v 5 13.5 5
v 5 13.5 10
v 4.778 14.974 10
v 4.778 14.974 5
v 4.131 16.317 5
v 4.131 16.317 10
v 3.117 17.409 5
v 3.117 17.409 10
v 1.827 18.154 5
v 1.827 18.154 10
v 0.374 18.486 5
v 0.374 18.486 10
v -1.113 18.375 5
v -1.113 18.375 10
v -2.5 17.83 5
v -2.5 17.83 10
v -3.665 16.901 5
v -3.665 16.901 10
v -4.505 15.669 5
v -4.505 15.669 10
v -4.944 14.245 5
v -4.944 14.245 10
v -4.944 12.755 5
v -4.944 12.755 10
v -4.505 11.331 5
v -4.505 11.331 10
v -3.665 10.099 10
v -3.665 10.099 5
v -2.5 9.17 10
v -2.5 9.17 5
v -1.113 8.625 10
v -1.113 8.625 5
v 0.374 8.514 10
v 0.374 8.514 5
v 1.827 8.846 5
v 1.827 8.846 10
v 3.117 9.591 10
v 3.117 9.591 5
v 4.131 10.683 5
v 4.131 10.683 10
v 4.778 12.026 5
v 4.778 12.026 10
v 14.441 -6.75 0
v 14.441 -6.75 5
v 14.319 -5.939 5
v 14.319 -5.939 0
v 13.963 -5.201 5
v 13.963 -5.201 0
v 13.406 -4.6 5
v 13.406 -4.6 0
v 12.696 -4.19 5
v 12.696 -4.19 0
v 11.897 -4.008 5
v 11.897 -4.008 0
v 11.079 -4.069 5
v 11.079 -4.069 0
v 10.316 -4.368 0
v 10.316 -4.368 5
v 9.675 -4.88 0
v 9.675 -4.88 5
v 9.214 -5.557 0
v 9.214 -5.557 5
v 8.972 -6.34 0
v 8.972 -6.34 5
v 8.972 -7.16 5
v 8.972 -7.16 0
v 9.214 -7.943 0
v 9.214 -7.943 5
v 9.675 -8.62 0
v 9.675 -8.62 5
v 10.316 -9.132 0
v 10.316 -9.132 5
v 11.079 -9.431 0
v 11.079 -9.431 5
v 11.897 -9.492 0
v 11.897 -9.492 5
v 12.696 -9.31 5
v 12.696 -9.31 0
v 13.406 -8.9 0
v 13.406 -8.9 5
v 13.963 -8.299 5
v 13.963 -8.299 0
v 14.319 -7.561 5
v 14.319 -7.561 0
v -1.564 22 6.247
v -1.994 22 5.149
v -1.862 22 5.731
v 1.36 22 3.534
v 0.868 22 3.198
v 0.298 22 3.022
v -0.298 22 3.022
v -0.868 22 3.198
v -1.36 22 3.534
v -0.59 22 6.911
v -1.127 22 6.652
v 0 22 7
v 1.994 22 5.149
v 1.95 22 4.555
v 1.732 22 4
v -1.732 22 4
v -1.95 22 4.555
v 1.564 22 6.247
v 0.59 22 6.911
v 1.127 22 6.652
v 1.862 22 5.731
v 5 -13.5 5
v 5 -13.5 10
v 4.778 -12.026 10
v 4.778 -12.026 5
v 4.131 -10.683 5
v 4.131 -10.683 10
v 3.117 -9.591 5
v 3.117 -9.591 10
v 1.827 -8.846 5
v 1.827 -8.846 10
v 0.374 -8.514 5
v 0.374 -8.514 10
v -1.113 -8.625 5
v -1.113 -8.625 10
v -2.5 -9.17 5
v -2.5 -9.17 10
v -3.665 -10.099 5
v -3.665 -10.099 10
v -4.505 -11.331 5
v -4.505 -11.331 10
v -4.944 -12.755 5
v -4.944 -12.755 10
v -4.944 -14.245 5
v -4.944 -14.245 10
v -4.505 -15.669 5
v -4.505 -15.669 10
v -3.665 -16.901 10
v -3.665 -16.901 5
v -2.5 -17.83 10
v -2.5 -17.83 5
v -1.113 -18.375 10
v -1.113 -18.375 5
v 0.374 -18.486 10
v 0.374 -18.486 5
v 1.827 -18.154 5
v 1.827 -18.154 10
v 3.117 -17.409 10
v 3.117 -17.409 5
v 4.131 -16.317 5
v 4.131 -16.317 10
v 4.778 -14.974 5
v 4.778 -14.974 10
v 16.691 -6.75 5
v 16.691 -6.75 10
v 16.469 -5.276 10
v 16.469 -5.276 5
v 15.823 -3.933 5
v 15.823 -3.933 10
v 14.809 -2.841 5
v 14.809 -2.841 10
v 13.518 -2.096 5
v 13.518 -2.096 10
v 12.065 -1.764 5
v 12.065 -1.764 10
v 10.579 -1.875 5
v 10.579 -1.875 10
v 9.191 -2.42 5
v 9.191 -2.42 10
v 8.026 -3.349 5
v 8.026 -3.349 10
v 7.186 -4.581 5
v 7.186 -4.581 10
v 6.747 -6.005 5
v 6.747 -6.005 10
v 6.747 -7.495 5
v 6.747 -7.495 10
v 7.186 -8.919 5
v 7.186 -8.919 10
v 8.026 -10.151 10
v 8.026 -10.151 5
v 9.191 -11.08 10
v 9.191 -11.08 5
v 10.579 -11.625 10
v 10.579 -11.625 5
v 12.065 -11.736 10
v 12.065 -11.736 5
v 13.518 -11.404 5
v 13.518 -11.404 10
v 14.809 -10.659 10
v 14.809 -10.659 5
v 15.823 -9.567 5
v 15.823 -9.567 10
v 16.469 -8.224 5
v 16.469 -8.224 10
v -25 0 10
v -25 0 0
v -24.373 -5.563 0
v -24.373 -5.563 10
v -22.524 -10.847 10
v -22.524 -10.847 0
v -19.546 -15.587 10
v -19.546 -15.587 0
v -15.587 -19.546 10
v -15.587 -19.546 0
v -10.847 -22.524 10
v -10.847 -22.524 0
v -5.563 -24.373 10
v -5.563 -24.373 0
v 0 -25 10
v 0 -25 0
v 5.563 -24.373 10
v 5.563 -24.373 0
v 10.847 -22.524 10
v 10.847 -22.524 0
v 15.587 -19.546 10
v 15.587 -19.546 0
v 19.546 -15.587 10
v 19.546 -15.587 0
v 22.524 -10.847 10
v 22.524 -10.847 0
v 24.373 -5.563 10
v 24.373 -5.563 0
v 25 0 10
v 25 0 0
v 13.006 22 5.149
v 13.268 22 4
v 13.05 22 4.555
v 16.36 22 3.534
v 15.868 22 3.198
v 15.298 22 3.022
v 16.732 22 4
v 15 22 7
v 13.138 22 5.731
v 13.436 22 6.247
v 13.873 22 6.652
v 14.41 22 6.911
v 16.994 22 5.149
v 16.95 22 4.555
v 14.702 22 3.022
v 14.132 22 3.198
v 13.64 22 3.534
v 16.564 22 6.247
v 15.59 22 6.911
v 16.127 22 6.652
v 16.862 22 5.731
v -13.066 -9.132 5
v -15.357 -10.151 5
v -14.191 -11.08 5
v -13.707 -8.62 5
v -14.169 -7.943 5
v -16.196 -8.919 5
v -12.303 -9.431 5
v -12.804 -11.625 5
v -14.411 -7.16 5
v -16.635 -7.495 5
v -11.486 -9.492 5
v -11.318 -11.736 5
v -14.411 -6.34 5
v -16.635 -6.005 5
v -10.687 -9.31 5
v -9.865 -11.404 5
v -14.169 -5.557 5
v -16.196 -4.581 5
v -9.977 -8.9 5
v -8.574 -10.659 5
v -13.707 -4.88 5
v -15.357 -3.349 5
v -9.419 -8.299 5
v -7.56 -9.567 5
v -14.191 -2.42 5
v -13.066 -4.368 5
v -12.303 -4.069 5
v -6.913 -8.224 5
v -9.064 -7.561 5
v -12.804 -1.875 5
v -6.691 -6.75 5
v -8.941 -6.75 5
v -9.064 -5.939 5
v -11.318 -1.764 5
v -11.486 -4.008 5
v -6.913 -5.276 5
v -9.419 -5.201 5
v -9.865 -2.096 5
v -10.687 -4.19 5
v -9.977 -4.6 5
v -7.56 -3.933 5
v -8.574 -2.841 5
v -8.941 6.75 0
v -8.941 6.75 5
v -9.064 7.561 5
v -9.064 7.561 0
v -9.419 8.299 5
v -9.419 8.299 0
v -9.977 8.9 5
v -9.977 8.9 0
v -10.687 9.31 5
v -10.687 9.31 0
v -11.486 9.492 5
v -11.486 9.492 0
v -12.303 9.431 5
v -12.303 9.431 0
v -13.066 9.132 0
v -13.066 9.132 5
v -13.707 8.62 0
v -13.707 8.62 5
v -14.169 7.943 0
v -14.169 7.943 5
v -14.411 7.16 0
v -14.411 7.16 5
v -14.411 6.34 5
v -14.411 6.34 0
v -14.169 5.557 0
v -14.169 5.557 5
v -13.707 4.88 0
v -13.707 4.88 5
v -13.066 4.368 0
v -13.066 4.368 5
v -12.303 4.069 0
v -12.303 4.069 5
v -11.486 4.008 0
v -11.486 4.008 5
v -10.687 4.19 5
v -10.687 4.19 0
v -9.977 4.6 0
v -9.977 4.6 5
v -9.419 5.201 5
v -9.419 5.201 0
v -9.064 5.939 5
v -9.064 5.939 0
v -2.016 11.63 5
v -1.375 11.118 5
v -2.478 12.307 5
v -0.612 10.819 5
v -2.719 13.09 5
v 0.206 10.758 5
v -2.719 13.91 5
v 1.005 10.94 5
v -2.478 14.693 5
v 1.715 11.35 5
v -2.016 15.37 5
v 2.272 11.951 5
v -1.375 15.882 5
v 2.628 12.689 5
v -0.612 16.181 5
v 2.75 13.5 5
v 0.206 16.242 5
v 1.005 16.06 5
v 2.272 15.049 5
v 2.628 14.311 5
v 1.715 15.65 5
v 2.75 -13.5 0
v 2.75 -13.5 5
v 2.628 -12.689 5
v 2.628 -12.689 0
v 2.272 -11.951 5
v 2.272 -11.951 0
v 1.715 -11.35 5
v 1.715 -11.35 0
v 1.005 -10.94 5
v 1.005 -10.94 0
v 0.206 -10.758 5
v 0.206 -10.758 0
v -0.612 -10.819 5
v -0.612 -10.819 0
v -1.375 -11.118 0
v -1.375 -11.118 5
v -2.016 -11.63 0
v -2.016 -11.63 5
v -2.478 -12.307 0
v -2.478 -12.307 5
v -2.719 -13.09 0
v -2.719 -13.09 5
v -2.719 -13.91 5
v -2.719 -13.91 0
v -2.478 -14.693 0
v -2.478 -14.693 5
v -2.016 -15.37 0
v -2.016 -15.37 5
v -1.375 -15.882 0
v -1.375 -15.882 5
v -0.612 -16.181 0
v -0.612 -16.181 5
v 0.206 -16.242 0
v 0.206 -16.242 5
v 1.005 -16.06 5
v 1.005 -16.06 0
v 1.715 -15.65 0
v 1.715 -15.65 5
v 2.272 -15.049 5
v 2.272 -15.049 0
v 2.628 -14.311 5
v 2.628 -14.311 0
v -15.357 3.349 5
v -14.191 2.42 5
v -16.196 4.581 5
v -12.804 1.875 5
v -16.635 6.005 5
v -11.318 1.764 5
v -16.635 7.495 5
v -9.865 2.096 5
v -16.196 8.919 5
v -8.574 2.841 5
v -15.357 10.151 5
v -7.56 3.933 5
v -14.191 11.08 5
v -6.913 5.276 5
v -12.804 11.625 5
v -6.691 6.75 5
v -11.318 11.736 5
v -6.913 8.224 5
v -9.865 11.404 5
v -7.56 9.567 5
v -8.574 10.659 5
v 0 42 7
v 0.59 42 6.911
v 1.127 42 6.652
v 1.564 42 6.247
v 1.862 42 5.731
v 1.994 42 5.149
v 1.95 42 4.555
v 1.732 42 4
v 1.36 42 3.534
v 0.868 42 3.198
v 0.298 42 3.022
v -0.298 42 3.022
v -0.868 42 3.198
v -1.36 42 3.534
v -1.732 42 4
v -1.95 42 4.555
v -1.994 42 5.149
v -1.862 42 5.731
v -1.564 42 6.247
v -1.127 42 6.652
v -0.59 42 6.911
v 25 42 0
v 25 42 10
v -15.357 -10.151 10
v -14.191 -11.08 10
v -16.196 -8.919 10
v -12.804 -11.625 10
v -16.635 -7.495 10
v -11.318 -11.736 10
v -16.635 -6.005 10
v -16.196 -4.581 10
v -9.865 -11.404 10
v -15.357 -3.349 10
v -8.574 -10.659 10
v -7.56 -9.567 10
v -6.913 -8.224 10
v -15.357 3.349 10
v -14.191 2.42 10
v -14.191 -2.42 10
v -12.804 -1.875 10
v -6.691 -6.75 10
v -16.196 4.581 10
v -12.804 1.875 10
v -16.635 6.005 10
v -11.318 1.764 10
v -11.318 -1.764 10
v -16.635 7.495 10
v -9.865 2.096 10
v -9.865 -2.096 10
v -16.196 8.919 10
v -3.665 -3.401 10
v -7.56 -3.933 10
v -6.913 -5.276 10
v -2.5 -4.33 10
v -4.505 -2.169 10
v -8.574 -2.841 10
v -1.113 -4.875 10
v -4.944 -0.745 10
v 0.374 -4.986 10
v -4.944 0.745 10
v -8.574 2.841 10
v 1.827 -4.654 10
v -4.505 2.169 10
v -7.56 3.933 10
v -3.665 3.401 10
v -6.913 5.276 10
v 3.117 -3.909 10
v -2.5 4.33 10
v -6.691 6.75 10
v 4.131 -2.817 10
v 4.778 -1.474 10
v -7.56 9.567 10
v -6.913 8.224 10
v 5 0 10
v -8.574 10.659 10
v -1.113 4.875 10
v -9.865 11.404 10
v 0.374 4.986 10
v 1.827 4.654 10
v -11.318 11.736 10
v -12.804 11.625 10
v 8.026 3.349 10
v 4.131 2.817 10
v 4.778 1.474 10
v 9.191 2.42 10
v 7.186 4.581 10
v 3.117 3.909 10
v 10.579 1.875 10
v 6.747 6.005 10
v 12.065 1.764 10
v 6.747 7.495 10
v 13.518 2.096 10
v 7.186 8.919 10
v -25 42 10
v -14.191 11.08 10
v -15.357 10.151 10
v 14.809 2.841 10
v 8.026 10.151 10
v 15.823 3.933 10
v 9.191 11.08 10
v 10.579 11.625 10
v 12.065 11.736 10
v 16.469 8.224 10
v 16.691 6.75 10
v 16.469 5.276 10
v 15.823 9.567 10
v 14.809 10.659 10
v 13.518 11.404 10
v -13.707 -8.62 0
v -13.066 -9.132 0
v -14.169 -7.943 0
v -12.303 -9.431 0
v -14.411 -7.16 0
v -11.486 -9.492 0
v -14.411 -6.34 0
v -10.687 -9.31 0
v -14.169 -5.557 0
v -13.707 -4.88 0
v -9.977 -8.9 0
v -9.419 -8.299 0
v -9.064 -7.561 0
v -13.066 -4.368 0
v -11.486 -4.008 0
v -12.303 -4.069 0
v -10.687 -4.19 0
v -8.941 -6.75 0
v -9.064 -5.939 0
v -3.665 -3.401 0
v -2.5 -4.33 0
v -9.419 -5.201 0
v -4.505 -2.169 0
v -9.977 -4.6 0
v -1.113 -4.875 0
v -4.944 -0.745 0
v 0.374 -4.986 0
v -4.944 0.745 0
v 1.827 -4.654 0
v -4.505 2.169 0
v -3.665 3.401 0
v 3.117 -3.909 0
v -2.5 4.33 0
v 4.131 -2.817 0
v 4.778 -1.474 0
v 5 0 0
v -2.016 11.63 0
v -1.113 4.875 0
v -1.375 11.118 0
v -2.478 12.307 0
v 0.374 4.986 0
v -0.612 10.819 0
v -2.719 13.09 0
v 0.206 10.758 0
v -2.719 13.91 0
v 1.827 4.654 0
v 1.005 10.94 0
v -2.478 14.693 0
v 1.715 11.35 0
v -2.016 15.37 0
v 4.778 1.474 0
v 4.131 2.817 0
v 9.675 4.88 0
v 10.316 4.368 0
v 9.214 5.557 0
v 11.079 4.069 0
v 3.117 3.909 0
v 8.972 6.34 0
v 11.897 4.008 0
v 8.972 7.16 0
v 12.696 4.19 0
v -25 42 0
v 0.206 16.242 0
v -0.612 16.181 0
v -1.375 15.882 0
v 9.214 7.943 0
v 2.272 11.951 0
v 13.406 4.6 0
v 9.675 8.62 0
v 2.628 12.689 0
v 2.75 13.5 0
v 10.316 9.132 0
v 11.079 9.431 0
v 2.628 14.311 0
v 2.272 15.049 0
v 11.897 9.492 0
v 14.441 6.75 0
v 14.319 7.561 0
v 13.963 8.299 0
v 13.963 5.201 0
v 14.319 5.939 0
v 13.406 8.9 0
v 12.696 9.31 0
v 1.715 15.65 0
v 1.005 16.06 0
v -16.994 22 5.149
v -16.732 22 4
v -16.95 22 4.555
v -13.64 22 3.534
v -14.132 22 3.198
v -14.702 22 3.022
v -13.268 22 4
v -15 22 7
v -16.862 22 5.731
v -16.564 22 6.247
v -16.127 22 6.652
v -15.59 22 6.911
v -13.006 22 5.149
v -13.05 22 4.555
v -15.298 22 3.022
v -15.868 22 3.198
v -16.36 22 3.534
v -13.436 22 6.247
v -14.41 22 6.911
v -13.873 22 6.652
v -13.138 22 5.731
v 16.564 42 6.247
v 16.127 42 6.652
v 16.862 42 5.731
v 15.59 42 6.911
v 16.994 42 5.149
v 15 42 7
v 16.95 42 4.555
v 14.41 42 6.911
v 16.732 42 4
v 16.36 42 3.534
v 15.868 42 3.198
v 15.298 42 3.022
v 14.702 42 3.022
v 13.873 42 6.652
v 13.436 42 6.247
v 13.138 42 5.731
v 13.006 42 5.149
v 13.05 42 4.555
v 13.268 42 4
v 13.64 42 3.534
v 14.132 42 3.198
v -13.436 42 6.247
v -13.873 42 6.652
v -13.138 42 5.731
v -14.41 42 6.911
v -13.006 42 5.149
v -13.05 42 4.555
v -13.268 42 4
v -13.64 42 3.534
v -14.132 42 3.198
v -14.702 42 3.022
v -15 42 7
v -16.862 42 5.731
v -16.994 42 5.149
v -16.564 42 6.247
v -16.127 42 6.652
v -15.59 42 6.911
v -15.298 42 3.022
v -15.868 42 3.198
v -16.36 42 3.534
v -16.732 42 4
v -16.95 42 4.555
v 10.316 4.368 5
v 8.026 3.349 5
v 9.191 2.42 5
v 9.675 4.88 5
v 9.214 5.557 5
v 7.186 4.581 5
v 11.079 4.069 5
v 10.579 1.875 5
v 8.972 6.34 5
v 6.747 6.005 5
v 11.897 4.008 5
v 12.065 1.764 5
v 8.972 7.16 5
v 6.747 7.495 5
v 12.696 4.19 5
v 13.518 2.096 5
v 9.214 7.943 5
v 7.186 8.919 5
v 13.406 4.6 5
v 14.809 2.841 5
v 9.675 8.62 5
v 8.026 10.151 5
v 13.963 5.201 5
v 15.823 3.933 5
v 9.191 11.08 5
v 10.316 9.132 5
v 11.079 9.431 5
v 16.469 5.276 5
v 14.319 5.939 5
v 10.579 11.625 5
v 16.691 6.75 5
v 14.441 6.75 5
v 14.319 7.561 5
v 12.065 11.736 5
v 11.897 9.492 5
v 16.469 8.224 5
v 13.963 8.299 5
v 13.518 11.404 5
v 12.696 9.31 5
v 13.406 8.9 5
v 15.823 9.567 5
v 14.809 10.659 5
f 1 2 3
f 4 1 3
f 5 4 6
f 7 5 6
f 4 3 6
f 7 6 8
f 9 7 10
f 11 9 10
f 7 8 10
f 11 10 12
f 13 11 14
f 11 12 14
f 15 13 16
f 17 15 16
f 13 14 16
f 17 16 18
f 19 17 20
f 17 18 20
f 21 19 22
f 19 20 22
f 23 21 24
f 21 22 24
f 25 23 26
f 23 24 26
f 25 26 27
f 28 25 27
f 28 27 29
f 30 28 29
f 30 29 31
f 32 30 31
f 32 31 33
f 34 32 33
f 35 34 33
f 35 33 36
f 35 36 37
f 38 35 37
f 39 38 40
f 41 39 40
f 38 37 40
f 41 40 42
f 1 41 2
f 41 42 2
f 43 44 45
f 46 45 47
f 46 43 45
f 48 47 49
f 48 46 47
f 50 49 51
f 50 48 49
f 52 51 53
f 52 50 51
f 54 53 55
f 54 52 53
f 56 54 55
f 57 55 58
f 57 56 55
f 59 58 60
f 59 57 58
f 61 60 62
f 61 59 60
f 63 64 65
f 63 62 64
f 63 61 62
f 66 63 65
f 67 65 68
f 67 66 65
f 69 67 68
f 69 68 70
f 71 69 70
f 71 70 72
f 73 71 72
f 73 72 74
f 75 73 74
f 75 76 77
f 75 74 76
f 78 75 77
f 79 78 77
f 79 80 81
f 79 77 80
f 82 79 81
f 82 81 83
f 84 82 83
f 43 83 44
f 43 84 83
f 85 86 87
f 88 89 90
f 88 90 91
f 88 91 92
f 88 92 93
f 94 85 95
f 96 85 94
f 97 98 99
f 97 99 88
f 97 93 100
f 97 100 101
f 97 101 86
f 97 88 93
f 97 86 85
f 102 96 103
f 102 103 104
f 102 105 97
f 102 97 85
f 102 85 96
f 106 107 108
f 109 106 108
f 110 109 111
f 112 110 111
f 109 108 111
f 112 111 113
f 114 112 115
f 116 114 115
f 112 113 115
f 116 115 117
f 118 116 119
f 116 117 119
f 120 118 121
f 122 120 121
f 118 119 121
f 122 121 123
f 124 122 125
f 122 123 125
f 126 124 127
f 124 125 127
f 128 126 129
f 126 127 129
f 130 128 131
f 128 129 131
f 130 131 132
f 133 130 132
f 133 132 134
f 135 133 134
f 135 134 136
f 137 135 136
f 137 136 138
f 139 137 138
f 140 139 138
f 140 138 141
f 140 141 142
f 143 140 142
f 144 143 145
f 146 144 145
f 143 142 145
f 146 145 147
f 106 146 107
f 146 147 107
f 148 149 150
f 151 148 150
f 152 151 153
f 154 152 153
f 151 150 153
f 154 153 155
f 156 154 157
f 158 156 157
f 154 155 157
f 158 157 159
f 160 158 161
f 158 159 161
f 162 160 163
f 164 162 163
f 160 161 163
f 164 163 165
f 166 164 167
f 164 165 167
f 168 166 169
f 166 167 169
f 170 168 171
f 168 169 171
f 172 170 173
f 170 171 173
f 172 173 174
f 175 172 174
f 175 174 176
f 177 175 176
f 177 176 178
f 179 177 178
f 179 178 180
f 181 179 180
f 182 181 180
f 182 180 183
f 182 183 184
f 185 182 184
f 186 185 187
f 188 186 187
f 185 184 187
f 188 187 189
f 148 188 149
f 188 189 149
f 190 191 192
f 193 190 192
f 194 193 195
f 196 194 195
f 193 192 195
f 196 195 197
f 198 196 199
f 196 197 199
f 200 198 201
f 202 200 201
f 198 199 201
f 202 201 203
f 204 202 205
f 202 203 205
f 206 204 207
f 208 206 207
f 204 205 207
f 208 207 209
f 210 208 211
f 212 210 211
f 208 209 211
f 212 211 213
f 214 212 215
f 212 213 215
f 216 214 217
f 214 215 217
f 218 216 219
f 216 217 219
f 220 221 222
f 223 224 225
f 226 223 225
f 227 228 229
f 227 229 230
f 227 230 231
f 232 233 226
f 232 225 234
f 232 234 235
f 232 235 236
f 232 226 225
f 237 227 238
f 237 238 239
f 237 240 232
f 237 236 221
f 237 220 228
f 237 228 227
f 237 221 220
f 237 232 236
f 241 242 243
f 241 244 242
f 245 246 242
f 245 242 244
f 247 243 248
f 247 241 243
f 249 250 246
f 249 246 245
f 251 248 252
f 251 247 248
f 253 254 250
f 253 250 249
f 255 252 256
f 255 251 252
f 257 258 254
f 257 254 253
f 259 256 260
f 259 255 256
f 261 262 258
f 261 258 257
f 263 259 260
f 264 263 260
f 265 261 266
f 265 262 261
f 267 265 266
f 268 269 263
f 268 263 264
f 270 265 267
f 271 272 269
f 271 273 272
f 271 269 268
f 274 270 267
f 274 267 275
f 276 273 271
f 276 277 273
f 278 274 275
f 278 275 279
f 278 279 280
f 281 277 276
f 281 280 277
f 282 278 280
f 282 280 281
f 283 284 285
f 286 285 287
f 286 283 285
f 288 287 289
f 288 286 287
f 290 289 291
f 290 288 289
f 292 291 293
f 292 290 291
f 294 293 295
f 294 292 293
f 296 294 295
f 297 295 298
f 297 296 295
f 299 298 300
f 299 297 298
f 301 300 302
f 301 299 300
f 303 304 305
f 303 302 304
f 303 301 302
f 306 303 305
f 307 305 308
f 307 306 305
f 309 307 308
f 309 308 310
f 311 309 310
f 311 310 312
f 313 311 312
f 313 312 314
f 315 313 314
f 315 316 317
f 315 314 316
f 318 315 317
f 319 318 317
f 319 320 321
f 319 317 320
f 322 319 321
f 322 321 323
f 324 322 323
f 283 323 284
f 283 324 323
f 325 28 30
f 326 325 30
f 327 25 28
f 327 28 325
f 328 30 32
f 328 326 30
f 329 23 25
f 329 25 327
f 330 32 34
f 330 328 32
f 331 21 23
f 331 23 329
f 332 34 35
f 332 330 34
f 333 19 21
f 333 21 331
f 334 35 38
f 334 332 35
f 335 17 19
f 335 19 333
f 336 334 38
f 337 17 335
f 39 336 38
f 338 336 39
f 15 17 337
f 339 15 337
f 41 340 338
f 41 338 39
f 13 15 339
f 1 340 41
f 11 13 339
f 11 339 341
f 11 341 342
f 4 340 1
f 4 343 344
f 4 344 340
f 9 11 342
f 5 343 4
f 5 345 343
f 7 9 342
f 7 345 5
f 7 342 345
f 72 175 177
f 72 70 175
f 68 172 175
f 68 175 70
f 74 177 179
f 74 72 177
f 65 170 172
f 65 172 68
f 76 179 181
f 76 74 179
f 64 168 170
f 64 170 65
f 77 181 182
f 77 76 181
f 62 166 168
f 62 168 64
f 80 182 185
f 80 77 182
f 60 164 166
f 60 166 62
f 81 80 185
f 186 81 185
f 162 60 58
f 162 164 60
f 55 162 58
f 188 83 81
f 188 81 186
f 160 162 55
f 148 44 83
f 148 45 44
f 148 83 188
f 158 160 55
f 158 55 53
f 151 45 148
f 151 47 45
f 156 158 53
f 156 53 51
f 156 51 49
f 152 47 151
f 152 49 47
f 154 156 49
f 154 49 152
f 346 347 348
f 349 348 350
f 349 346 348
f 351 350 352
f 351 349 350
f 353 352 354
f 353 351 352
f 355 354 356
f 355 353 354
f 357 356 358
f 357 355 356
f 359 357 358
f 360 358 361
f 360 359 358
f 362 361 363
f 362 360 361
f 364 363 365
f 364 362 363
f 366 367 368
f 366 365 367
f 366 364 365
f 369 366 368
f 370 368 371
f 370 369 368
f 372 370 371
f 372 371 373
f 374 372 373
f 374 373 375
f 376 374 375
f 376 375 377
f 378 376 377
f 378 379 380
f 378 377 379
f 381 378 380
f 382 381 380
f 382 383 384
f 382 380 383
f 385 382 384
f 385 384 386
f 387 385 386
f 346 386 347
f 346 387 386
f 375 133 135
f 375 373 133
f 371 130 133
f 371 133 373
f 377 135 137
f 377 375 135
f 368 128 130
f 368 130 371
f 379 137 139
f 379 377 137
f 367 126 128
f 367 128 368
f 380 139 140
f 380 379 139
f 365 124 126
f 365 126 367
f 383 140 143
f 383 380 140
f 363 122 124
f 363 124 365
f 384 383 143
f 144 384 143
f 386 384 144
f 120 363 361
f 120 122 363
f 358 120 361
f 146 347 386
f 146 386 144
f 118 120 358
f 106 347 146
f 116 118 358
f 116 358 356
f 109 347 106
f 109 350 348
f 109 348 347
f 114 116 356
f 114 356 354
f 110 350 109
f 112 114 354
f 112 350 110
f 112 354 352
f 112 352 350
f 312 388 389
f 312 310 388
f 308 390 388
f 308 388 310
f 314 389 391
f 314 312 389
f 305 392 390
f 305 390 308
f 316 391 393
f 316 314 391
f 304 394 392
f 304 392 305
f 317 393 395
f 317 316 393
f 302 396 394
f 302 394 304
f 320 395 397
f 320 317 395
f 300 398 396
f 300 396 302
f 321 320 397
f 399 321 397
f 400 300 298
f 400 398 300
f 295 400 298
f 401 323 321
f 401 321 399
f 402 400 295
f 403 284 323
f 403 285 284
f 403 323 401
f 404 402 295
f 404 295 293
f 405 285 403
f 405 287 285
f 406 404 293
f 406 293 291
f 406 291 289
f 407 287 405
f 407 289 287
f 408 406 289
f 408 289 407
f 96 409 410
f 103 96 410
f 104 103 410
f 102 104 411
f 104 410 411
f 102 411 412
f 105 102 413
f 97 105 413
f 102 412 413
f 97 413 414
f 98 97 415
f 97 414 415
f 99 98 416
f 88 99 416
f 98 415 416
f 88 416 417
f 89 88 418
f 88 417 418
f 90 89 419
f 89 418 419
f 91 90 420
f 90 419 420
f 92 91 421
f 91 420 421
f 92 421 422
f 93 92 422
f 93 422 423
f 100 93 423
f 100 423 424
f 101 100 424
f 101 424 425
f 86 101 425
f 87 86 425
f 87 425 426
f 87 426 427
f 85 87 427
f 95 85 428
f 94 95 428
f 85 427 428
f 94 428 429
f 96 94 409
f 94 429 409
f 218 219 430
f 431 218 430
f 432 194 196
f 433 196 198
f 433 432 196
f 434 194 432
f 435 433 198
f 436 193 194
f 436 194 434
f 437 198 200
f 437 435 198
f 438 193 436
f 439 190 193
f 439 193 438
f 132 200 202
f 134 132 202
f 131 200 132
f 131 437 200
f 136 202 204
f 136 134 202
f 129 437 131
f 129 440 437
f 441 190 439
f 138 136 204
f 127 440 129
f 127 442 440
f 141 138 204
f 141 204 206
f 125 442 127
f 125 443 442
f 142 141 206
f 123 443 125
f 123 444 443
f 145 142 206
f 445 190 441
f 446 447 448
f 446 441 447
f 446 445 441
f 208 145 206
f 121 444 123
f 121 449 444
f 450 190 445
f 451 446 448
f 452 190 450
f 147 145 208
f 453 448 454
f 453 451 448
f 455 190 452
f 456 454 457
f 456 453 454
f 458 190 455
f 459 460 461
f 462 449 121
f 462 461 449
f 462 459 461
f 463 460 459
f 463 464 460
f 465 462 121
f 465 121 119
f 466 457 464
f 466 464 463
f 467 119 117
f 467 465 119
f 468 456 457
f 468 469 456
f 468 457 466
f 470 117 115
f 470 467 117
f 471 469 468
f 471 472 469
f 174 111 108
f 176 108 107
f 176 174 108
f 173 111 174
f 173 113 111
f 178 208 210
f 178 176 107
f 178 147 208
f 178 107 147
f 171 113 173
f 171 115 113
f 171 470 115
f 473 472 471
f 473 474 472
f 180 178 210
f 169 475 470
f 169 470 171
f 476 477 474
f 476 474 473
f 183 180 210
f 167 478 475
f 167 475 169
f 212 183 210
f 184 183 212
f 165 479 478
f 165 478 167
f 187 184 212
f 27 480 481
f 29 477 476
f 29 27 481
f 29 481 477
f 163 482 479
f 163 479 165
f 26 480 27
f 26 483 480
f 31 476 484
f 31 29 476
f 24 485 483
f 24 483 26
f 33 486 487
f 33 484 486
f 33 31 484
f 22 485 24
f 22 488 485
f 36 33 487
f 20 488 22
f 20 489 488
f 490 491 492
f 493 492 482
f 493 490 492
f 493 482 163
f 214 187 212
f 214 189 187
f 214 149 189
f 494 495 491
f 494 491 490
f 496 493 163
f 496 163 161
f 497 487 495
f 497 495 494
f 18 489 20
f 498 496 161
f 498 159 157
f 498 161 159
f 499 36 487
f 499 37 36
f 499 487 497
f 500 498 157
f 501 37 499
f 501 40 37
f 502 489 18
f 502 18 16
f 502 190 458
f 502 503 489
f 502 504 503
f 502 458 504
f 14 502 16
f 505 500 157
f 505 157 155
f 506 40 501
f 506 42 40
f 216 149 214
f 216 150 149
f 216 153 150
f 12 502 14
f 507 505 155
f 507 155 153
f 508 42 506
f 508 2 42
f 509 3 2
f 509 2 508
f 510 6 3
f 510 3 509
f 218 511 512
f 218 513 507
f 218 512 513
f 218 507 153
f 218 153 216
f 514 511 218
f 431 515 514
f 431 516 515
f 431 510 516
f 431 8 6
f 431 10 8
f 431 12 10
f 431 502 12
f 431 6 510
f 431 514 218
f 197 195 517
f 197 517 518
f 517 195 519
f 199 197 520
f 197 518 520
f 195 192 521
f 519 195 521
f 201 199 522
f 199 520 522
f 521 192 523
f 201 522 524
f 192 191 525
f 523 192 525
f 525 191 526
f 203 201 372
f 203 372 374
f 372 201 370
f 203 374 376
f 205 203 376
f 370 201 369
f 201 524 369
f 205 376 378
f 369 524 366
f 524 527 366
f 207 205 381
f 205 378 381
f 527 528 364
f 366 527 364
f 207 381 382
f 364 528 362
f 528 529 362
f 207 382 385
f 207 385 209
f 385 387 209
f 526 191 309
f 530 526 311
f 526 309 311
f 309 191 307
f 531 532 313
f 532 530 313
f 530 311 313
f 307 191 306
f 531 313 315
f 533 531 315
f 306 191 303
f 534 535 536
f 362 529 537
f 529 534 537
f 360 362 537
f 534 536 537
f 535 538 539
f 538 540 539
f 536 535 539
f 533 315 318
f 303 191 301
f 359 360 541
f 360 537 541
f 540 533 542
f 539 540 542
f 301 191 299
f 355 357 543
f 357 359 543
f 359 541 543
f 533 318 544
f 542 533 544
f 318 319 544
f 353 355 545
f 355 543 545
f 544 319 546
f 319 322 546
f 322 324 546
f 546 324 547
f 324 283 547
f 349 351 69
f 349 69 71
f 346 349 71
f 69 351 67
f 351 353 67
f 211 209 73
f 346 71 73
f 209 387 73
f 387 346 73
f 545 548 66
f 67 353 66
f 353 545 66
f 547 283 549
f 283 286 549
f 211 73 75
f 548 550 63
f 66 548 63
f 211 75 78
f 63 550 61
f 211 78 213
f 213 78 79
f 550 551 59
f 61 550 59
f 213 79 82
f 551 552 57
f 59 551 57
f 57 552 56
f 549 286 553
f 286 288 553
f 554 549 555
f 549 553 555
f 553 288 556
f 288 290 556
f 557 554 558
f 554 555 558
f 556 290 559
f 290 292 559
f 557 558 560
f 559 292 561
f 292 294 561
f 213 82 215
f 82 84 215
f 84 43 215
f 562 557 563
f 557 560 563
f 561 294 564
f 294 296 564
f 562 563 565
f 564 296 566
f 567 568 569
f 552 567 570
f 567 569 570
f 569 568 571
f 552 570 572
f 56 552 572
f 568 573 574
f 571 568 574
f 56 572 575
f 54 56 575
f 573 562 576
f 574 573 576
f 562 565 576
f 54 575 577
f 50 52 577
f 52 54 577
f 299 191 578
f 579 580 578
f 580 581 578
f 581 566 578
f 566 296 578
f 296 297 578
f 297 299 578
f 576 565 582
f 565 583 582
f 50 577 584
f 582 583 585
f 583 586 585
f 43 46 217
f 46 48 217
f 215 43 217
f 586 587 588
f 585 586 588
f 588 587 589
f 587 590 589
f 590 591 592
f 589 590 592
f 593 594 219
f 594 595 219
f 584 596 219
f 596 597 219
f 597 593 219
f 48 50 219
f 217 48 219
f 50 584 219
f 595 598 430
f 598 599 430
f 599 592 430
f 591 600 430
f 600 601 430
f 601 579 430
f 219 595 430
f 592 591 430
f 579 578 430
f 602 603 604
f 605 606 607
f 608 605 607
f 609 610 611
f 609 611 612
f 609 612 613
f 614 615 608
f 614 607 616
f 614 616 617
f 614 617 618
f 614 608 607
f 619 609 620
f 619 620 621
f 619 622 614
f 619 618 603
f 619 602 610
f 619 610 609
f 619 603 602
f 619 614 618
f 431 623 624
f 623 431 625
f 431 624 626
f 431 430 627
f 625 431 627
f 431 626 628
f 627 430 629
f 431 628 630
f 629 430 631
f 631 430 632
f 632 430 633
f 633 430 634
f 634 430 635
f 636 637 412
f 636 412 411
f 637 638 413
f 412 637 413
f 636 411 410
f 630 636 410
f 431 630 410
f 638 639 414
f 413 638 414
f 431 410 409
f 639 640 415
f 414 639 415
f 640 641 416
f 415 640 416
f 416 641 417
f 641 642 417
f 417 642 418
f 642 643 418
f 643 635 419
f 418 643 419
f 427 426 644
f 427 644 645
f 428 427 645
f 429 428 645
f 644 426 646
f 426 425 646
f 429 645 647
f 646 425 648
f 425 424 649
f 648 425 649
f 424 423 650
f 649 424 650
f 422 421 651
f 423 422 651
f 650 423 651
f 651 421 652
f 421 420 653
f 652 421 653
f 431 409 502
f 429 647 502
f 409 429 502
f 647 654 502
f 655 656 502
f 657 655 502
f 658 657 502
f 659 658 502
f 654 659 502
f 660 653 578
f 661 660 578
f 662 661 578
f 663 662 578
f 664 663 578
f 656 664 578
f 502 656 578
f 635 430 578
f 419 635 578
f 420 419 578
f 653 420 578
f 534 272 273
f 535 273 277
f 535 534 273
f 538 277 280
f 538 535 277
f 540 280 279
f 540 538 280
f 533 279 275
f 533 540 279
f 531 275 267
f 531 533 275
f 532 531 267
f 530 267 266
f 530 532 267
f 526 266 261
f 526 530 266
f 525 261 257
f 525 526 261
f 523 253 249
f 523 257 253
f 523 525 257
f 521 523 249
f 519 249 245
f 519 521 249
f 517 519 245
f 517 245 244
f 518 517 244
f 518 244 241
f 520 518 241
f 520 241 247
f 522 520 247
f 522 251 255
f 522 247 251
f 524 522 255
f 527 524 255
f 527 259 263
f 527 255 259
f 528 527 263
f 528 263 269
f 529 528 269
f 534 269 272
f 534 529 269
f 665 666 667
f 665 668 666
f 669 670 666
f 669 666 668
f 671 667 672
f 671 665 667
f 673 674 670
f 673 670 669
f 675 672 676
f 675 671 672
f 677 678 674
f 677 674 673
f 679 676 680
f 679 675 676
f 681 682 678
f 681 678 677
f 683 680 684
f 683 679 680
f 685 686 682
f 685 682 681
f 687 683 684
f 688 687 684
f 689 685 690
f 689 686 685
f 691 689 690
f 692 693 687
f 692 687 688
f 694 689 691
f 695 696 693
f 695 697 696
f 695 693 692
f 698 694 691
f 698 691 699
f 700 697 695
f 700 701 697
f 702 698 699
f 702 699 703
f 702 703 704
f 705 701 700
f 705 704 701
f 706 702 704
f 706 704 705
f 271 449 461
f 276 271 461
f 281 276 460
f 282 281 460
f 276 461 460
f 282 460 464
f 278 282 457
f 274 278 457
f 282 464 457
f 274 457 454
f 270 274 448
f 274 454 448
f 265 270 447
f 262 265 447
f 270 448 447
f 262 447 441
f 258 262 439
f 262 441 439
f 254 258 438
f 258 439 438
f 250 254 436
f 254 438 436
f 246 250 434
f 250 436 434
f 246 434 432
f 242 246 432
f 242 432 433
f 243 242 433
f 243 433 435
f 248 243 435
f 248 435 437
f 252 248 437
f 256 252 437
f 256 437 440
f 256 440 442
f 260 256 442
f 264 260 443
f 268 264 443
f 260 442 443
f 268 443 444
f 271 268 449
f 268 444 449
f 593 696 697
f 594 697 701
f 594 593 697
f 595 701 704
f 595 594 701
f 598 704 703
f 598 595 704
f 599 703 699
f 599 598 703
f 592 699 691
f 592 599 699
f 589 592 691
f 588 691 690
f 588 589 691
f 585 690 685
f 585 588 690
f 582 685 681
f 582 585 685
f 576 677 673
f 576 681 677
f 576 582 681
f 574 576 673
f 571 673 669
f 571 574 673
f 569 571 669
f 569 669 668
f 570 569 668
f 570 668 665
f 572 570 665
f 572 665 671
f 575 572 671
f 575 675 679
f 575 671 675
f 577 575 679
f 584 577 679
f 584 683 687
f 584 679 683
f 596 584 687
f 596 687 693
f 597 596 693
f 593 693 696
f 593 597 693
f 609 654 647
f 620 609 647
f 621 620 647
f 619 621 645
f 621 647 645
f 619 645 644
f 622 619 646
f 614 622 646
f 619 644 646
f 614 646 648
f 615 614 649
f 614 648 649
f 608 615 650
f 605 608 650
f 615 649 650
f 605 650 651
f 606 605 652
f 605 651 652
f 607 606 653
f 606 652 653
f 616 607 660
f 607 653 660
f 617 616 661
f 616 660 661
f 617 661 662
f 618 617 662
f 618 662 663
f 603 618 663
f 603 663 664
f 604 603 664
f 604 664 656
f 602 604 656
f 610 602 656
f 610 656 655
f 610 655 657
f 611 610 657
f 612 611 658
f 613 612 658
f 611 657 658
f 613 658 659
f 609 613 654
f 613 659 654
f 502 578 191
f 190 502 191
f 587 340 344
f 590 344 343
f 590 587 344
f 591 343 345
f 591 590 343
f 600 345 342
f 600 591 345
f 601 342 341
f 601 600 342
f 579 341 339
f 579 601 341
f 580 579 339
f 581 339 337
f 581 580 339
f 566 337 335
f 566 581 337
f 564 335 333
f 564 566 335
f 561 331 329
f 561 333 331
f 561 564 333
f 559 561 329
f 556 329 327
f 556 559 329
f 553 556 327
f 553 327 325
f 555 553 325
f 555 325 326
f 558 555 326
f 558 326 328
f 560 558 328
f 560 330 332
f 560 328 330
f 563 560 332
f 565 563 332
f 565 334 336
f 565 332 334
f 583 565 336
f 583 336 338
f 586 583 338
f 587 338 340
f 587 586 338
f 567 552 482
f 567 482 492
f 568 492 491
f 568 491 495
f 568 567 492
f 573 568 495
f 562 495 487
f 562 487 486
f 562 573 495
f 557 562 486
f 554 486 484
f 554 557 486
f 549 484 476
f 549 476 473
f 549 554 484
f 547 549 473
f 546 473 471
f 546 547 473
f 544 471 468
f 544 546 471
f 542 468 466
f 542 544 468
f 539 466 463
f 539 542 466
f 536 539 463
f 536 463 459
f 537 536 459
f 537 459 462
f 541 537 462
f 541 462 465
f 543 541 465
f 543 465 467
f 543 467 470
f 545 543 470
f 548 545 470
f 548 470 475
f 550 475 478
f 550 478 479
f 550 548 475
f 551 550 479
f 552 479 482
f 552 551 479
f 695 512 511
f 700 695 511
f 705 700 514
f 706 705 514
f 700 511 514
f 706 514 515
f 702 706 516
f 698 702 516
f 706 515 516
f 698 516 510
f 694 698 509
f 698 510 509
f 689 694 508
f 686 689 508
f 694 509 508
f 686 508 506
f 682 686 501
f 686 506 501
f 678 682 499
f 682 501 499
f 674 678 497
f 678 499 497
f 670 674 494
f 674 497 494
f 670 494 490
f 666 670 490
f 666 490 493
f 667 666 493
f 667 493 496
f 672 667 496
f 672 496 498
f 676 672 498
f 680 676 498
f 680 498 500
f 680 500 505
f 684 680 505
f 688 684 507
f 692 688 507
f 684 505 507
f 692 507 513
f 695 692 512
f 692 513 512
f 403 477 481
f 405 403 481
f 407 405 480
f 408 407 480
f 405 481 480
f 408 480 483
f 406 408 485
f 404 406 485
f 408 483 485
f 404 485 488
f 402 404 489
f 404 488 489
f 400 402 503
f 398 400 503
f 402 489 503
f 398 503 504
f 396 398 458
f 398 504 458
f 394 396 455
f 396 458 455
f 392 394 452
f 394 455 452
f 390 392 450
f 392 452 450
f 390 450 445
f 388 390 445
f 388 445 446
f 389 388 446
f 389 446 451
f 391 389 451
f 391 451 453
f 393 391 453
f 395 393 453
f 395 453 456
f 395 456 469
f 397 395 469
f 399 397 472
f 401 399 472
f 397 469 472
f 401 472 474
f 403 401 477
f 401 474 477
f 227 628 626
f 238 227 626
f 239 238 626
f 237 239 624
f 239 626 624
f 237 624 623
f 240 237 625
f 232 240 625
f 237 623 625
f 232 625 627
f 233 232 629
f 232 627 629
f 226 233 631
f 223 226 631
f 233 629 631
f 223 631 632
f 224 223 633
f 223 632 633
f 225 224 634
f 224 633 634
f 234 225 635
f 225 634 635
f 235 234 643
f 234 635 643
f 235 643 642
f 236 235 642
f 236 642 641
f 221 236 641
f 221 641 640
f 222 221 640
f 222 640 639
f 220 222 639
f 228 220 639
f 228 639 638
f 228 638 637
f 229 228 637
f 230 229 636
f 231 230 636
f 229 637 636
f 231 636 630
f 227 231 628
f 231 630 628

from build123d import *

# Parameters (mm, degrees)
SKETCH_1_R          = 5
SKETCH_1_R_2        = 2.75
EXTRUDE_1_DEPTH     = 10
SKETCH_2_R          = 2
CUT_EXTRUDE_1_DEPTH = 20
SKETCH_4_R          = 5
CUT_EXTRUDE_3_DEPTH = 5


with BuildPart() as part:
    # 스케치1 → 보스-돌출1 (new body)
    with BuildSketch(Plane.XY):
        with BuildLine():
            Line((25, 0), (25, 42))
            Line((25, 42), (-25, 42))
            Line((-25, 42), (-25, 0))
            ThreePointArc((-25, 0), (0, -25), (25, 0))
        make_face()
        Circle(SKETCH_1_R, mode=Mode.SUBTRACT)
        with Locations((0, -13.5)):
            Circle(SKETCH_1_R_2, mode=Mode.SUBTRACT)
        with Locations((-11.691342951, -6.75)):
            Circle(SKETCH_1_R_2, mode=Mode.SUBTRACT)
        with Locations((-11.691342951, 6.75)):
            Circle(SKETCH_1_R_2, mode=Mode.SUBTRACT)
        with Locations((0, 13.5)):
            Circle(SKETCH_1_R_2, mode=Mode.SUBTRACT)
        with Locations((11.691342951, 6.75)):
            Circle(SKETCH_1_R_2, mode=Mode.SUBTRACT)
        with Locations((11.691342951, -6.75)):
            Circle(SKETCH_1_R_2, mode=Mode.SUBTRACT)
    extrude(amount=EXTRUDE_1_DEPTH)

    # 스케치2 → 컷-돌출1 (cut)
    with BuildSketch(Plane(origin=(0, 42, 0), x_dir=(1, 0, 0), z_dir=(0, 1, 0))):
        with Locations(Location((0, -5, 0), (0, 0, 270))):
            Circle(SKETCH_2_R)
        with Locations(Location((15, -5, 0), (0, 0, 270))):
            Circle(SKETCH_2_R)
        with Locations(Location((-15, -5, 0), (0, 0, 270))):
            Circle(SKETCH_2_R)
    extrude(amount=-CUT_EXTRUDE_1_DEPTH, mode=Mode.SUBTRACT)

    # 스케치4 → 컷-돌출3 (cut)
    with BuildSketch(Plane.XY.offset(10)):
        with Locations((0, 13.5)):
            Circle(SKETCH_4_R)
        with Locations((11.691342951, 6.75)):
            Circle(SKETCH_4_R)
        with Locations((11.691342951, -6.75)):
            Circle(SKETCH_4_R)
        with Locations((0, -13.5)):
            Circle(SKETCH_4_R)
        with Locations((-11.691342951, -6.75)):
            Circle(SKETCH_4_R)
        with Locations((-11.691342951, 6.75)):
            Circle(SKETCH_4_R)
    extrude(amount=-CUT_EXTRUDE_3_DEPTH, mode=Mode.SUBTRACT)


solid = part.part
